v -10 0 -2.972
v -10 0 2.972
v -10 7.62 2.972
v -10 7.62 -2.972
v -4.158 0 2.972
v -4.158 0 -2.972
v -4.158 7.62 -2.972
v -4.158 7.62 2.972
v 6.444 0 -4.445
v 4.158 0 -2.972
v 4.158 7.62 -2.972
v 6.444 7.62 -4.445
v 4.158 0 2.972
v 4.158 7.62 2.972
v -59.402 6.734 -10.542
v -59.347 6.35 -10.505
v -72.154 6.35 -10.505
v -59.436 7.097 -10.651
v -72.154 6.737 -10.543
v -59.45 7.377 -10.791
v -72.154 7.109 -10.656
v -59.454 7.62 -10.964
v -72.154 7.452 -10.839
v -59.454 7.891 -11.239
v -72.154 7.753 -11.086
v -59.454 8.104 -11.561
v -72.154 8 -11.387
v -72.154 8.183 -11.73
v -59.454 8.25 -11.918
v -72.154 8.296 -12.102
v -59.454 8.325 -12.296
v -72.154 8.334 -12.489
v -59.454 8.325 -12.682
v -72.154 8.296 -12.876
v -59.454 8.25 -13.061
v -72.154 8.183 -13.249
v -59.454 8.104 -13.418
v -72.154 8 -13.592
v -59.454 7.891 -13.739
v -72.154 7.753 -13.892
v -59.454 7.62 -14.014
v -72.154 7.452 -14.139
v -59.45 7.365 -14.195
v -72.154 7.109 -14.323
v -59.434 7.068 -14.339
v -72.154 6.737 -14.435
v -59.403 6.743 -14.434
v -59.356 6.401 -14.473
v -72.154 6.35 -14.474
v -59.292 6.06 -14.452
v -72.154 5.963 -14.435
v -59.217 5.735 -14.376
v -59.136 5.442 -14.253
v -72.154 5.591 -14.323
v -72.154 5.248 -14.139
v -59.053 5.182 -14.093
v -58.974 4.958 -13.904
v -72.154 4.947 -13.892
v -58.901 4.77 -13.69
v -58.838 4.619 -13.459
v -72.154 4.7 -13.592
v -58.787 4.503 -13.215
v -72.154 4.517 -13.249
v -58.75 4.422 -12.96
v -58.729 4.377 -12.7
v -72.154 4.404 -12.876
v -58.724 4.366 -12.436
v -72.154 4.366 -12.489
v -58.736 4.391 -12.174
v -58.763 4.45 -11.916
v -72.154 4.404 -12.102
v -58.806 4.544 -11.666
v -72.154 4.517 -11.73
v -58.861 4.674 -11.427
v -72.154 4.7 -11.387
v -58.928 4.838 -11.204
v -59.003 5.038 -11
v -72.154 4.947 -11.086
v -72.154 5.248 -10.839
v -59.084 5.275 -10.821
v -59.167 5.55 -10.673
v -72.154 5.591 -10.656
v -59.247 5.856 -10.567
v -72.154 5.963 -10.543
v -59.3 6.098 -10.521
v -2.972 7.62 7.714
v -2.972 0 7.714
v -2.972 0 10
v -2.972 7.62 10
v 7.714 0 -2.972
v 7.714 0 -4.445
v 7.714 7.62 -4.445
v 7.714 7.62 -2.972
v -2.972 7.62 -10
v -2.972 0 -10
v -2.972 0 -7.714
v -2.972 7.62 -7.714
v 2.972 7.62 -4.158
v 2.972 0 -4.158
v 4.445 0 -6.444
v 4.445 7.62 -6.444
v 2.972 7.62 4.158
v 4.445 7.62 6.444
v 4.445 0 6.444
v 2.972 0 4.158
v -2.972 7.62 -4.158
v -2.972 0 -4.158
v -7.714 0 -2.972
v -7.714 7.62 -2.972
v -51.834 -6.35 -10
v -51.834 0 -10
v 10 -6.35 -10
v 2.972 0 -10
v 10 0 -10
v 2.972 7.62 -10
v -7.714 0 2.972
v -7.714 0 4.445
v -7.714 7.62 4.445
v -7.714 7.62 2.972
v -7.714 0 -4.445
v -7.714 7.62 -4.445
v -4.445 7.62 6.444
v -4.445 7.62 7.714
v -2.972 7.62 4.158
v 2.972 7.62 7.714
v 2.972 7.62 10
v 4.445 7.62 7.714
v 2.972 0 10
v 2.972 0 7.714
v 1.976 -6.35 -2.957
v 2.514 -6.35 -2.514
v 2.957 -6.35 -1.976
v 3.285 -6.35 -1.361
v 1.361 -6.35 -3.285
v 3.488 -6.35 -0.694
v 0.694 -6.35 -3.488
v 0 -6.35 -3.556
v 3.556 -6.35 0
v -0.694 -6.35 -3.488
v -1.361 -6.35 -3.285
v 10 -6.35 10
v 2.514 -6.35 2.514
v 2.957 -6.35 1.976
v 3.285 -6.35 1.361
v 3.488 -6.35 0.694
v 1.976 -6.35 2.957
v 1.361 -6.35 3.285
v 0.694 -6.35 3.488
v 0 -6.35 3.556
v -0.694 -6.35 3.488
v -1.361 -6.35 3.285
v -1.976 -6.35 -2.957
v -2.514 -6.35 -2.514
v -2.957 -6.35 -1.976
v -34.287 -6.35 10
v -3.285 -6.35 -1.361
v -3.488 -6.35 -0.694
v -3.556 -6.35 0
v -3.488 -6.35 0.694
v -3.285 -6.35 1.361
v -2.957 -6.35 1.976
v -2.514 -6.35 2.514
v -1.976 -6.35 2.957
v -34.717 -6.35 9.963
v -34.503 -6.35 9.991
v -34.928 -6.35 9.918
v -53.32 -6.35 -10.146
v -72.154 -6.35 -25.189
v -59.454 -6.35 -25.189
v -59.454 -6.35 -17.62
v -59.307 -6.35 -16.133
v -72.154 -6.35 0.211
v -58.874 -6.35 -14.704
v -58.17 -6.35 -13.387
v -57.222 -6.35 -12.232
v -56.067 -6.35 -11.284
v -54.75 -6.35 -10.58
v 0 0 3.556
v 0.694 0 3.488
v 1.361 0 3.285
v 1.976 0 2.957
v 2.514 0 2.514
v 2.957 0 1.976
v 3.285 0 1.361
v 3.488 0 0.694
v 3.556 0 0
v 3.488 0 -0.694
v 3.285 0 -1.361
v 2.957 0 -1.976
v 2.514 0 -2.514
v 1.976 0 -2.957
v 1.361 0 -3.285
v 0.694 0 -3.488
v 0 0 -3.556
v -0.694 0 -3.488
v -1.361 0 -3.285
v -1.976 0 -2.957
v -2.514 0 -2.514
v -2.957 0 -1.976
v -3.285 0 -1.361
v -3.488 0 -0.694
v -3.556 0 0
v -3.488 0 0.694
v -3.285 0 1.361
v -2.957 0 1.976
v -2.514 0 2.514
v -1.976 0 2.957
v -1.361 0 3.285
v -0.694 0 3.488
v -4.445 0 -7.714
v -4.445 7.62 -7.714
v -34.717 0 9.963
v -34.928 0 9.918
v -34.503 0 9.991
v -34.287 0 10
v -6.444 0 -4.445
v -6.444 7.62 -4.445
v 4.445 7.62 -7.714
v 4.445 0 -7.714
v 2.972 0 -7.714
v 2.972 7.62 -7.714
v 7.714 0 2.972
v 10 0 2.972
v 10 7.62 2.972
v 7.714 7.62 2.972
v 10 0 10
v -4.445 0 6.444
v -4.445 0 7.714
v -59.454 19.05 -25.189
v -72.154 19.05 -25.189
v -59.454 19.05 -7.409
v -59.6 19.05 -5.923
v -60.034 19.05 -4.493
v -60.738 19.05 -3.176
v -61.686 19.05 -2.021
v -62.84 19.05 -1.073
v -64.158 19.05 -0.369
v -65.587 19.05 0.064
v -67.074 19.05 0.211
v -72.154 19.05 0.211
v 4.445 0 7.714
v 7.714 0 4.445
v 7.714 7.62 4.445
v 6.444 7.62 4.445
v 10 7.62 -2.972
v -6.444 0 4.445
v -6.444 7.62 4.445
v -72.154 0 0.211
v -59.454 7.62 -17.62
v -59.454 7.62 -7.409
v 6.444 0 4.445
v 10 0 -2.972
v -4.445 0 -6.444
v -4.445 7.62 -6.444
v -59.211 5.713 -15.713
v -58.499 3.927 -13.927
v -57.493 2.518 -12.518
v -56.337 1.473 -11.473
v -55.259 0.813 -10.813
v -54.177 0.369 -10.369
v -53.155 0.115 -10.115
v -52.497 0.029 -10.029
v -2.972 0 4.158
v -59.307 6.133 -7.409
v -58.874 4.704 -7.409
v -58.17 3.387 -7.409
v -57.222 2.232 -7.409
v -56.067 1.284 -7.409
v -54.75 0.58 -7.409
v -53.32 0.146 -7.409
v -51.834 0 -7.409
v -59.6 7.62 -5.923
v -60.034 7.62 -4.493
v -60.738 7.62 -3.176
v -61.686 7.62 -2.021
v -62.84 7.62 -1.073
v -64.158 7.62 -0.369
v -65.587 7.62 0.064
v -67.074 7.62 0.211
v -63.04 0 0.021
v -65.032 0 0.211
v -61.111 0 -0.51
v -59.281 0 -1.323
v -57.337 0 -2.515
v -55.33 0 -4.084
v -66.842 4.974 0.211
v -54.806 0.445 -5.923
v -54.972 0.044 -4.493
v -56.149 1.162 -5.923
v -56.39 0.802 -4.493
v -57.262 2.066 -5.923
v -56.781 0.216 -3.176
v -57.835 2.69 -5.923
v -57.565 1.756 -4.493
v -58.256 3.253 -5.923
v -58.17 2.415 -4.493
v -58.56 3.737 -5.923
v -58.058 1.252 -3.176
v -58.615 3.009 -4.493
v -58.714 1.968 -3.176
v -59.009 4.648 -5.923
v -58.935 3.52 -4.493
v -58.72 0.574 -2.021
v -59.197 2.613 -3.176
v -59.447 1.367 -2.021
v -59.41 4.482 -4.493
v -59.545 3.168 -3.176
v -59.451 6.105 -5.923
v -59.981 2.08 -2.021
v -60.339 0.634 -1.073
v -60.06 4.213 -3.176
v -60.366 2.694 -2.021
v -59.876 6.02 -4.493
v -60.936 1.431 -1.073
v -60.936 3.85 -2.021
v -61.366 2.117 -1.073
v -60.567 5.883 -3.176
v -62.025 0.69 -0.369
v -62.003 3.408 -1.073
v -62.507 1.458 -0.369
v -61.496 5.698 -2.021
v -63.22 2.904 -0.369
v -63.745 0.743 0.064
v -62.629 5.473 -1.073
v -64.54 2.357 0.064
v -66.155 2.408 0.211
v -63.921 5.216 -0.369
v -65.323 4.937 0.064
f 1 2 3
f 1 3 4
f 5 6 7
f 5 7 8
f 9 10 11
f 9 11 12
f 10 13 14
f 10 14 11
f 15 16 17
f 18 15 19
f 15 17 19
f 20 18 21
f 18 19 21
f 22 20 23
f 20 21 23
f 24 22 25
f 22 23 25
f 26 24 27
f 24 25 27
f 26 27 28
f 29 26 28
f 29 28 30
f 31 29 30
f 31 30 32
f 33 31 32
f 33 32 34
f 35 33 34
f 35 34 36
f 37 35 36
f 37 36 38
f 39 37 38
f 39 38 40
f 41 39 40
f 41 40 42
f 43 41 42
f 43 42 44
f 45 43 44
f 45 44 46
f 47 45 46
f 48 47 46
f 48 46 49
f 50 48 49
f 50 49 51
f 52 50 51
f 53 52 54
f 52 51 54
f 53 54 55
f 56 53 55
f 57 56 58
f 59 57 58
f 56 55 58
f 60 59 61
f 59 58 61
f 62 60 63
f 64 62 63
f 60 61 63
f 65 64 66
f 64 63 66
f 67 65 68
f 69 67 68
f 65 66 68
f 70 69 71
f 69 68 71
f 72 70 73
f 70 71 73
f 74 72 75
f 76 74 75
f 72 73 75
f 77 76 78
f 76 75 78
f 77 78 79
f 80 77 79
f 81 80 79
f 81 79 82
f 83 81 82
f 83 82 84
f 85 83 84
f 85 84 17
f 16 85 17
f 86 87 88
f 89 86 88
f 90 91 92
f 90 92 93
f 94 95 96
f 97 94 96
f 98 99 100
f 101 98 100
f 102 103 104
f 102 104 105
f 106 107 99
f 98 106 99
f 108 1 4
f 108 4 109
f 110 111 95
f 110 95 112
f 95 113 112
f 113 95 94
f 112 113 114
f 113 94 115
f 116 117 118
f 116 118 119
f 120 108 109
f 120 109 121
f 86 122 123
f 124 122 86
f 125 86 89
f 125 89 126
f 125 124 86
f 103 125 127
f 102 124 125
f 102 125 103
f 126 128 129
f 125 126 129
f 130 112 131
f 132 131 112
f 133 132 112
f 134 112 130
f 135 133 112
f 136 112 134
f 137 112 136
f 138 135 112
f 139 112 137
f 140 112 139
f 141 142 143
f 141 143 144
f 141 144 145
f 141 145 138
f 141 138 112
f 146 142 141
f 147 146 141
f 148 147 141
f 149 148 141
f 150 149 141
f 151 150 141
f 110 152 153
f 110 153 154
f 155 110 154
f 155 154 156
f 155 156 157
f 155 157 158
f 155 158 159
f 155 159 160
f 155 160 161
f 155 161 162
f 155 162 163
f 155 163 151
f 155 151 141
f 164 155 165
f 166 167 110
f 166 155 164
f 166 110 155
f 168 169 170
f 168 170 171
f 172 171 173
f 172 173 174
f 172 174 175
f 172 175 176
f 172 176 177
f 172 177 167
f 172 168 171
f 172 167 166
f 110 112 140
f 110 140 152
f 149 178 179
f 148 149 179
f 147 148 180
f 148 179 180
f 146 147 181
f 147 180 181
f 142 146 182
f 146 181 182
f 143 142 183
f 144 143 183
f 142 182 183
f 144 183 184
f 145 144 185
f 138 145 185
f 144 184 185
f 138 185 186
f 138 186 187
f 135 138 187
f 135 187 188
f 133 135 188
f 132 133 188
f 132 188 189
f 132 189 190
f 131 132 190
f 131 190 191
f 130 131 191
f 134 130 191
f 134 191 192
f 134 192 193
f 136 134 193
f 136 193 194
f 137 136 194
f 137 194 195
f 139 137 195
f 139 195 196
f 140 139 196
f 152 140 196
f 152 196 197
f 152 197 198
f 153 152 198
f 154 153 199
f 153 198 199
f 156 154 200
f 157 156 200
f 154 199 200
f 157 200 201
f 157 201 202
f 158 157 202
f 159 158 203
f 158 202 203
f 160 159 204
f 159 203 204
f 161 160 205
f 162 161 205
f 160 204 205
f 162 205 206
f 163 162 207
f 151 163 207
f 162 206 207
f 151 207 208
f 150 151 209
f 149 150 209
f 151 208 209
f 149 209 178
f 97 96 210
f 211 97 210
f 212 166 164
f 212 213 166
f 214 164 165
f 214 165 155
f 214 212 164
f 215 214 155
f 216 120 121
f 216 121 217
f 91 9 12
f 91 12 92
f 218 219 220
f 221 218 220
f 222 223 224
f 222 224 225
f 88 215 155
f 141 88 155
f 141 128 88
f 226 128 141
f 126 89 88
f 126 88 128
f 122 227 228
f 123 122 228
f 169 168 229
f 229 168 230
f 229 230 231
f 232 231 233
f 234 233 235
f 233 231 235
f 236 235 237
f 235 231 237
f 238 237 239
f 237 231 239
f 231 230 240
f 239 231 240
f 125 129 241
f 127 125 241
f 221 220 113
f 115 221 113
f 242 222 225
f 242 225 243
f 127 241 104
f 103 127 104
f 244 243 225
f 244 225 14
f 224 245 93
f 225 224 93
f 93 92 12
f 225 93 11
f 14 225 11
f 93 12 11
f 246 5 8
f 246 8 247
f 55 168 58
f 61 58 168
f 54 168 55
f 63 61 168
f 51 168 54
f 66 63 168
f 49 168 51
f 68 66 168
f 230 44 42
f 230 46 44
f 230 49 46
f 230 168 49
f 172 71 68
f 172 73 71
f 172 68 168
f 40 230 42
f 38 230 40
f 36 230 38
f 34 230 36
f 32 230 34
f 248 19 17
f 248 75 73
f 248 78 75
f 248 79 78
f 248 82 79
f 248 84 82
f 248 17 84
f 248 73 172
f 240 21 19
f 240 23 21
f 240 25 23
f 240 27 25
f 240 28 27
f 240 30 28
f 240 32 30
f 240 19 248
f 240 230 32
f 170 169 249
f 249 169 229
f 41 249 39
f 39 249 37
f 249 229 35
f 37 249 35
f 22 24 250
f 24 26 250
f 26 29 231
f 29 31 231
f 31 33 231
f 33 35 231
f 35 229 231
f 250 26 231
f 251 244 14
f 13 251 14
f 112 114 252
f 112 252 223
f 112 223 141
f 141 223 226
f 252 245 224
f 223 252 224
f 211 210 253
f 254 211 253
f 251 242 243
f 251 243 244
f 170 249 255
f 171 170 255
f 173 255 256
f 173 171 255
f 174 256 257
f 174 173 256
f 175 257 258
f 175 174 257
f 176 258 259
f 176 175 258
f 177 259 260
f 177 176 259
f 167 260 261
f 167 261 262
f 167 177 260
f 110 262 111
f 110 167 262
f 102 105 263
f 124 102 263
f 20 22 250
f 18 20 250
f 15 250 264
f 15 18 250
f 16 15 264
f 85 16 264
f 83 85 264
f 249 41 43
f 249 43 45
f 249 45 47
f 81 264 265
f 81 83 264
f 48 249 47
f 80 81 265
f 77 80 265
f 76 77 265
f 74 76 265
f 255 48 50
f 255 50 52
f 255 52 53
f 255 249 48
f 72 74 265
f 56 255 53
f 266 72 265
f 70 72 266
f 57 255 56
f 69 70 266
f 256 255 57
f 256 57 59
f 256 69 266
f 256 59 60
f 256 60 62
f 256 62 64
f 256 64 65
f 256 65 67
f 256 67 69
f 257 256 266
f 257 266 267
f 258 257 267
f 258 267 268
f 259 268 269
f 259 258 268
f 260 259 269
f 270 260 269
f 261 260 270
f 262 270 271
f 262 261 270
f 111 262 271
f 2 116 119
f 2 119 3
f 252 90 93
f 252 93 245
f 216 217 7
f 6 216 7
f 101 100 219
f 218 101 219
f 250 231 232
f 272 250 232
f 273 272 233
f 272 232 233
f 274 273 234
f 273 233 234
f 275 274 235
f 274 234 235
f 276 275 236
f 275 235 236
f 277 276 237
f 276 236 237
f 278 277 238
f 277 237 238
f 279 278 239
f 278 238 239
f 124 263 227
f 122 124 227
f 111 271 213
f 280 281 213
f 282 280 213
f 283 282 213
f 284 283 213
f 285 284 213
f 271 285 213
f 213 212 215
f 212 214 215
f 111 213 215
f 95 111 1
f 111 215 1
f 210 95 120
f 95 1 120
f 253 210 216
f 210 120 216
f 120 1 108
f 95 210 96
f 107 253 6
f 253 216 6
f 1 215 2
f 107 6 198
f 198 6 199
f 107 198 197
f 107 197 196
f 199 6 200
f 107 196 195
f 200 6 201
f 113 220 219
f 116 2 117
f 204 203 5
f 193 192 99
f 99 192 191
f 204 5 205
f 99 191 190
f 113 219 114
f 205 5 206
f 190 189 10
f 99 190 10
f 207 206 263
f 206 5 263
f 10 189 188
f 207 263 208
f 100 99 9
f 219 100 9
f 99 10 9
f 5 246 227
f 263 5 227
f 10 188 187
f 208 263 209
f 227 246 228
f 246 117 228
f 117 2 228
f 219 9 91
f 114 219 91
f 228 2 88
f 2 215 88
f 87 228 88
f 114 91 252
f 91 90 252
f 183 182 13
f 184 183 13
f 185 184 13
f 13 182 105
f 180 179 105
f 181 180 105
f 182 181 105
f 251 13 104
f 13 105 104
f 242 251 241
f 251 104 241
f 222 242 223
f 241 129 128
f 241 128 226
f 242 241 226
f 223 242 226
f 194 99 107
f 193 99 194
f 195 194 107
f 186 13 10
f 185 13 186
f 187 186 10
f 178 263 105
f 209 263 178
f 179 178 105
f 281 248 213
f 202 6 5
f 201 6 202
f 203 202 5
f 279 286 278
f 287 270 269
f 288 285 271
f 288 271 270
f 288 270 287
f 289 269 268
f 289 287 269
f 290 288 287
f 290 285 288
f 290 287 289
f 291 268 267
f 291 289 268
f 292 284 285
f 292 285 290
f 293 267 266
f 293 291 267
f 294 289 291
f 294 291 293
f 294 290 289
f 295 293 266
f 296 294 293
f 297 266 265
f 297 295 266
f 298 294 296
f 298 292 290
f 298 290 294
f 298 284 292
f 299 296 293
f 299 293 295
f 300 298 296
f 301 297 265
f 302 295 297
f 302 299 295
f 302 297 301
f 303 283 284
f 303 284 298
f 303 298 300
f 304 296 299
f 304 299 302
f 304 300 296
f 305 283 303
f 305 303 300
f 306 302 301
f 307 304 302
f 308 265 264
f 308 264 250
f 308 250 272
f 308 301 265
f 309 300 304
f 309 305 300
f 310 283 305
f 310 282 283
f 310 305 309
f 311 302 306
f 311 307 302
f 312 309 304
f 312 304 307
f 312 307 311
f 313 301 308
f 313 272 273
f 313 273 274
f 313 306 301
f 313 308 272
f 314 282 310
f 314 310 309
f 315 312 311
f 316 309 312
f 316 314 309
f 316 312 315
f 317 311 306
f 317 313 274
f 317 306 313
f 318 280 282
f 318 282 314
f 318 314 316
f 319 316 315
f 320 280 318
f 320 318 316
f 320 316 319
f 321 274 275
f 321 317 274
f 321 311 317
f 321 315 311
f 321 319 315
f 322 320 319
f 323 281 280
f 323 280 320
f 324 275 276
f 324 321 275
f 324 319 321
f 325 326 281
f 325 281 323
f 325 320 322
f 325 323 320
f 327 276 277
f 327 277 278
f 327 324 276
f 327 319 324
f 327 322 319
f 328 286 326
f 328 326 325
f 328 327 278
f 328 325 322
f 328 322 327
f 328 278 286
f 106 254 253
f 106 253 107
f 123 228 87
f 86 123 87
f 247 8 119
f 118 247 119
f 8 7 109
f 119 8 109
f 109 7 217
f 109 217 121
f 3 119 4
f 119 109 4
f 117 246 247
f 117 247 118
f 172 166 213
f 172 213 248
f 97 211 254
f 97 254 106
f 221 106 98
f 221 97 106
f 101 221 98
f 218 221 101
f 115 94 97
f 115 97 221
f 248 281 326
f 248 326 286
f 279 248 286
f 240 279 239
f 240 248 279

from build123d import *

# Parameters (mm, degrees)
BOSS_EXTRUDE1_DEPTH   = 7.62
BOSS_EXTRUDE1_2_DEPTH = 7.62
BOSS_EXTRUDE1_3_DEPTH = 7.62
BOSS_EXTRUDE1_4_DEPTH = 7.62
SKETCH2_W             = 82.1538108
SKETCH2_H             = 20
BOSS_EXTRUDE2_DEPTH   = 6.35
CUT_EXTRUDE1_DEPTH    = 75.17097352
FILLET1_R             = 2.54
SKETCH6_W             = 25.4
SKETCH6_H             = 25.4
BOSS_EXTRUDE7_DEPTH   = 12.7
FILLET3_R             = 7.62
FILLET5_R             = 7.62
SKETCH11_R            = 1.984375
CUT_EXTRUDE3_DEPTH    = 89.015038158
SKETCH12_R            = 3.556
CUT_EXTRUDE4_DEPTH    = 79.762749597


with BuildPart() as part:
    # Sketch1 → Boss-Extrude1 (new body)
    with BuildSketch(Plane(origin=(0, 0, 0), x_dir=(1, 0, 0), z_dir=(0, 1, 0))):
        Polygon((-2.9718, 10), (-2.9718, 7.714), (-4.4450054, 7.714), (-4.4450054, 6.444), (-2.9718, 4.158), (2.9718, 4.158), (4.4449946, 6.444), (4.4449946, 7.714), (2.9718, 7.714), (2.9718, 10), align=None)
    extrude(amount=BOSS_EXTRUDE1_DEPTH)



with BuildPart() as body_2:
    # Sketch1 → Boss-Extrude1 2 (new body)
    with BuildSketch(Plane(origin=(0, 0, 0), x_dir=(1, 0, 0), z_dir=(0, 1, 0))):
        Polygon((4.158, -2.9718), (4.158, 2.9718), (6.444, 4.4449946), (7.714, 4.4449946), (7.714, 2.9718), (10, 2.9718), (10, -2.9718), (7.714, -2.9718), (7.714, -4.4450054), (6.444, -4.4450054), align=None)
    extrude(amount=BOSS_EXTRUDE1_2_DEPTH)


with BuildPart() as body_3:
    # Sketch1 → Boss-Extrude1 3 (new body)
    with BuildSketch(Plane(origin=(0, 0, 0), x_dir=(1, 0, 0), z_dir=(0, 1, 0))):
        Polygon((4.4450054, -6.444), (2.9718, -4.158), (-2.9718, -4.158), (-4.4449946, -6.444), (-4.4449946, -7.714), (-2.9718, -7.714), (-2.9718, -10), (2.9718, -10), (2.9718, -7.714), (4.4450054, -7.714), align=None)
    extrude(amount=BOSS_EXTRUDE1_3_DEPTH)


with BuildPart() as body_4:
    # Sketch1 → Boss-Extrude1 4 (new body)
    with BuildSketch(Plane(origin=(0, 0, 0), x_dir=(1, 0, 0), z_dir=(0, 1, 0))):
        Polygon((-10, -2.9718), (-10, 2.9718), (-7.714, 2.9718), (-7.714, 4.4450054), (-6.444, 4.4450054), (-4.158, 2.9718), (-4.158, -2.9718), (-6.444, -4.4449946), (-7.714, -4.4449946), (-7.714, -2.9718), align=None)
    extrude(amount=BOSS_EXTRUDE1_4_DEPTH)


with BuildPart() as part_1:
    add(part.part)

    add(body_2.part)  # Boss-Extrude2 merges body 2

    add(body_3.part)  # Boss-Extrude2 merges body 3

    add(body_4.part)  # Boss-Extrude2 merges body 4
    # Sketch2 → Boss-Extrude2 (add)
    with BuildSketch(Plane.XZ):
        with Locations((-31.0769054, 0)):
            Rectangle(SKETCH2_W, SKETCH2_H)
    extrude(amount=BOSS_EXTRUDE2_DEPTH)

    # Sketch4 → Cut-Extrude1 (cut, through all)
    with BuildSketch(Plane(origin=(0, -6.35, 0), x_dir=(-1, 0, 0), z_dir=(0, -1, 0))):
        Polygon((72.1538108, -10), (34.6126108, -10), (72.1538108, -0.2108), align=None)
    extrude(amount=-CUT_EXTRUDE1_DEPTH, mode=Mode.SUBTRACT)

    # Fillet1
    fillet1_edges = [part_1.edges().sort_by_distance(p)[0] for p in [
        (-34.6126108, -3.175, 10),
    ]]
    fillet(fillet1_edges, radius=FILLET1_R)

    # Sketch6 → Boss-Extrude7 (add)
    with BuildSketch(Plane.ZY.offset(72.1538108)):
        with Locations((-12.4892, 6.35)):
            Rectangle(SKETCH6_W, SKETCH6_H)
    extrude(amount=-BOSS_EXTRUDE7_DEPTH)

    # Fillet3
    fillet3_edges = [part_1.edges().sort_by_distance(p)[0] for p in [
        (-59.4538108, 0, -4.8946),
        (-59.4538108, -3.175, -10),
    ]]
    fillet(fillet3_edges, radius=FILLET3_R)

    # Fillet5
    # the kernel refuses this fillet: 7.62 mm, written as the material it takes off along each edge
    with BuildSketch(Plane(origin=(-59.4538108, 38.1, 0.2108), x_dir=(-1, 0, 0), z_dir=(0, -1, 0))) as fillet5_piece_1:
        with BuildLine():
            CenterArc((FILLET5_R, FILLET5_R), FILLET5_R, 180, 90)
            Line((0, FILLET5_R), (0, 0))
            Line((0, 0), (FILLET5_R, 0))
        make_face()
    extrude(amount=30.48, mode=Mode.SUBTRACT)
    with BuildSketch(Plane(origin=(-51.8338108, 7.62, 0.2108), x_dir=(0.5976672776328273, 0.8017442392976484, 0), z_dir=(-0.8017442392976484, 0.5976672776328273, 0))) as fillet5_piece_2_section:
        with BuildLine():
            CenterArc((7.62 + FILLET5_R, FILLET5_R), FILLET5_R, 180, 90)
            Line((7.62, FILLET5_R), (7.62, 0))
            Line((7.62, 0), (7.62 + FILLET5_R, 0))
        make_face()
    fillet5_piece_2 = revolve(axis=Axis((-51.8338108, 7.62, 0.2108), (0, 0, -1)), revolution_arc=233.296989237, mode=Mode.PRIVATE)
    fillet5_piece_2 = split(fillet5_piece_2, bisect_by=Plane(origin=(-57.548345525, 0, -2.163807672), z_dir=(0, 1, 0)), keep=Keep.TOP, mode=Mode.PRIVATE)
    add(fillet5_piece_2, mode=Mode.SUBTRACT)

    # Sketch11 → Cut-Extrude3 (cut, through all)
    with BuildSketch(Plane.ZY.offset(72.1538108)):
        with Locations((-12.4892, 6.35)):
            Circle(SKETCH11_R)
    extrude(amount=-CUT_EXTRUDE3_DEPTH, mode=Mode.SUBTRACT)

    # Sketch12 → Cut-Extrude4 (cut, through all)
    with BuildSketch(Plane(origin=(0, 0, 0), x_dir=(1, 0, 0), z_dir=(0, 1, 0))):
        with Locations(Location((0, 0, 0), (0, 0, 270))):
            Circle(SKETCH12_R)
    extrude(amount=-CUT_EXTRUDE4_DEPTH, mode=Mode.SUBTRACT)


solid = part_1.part
